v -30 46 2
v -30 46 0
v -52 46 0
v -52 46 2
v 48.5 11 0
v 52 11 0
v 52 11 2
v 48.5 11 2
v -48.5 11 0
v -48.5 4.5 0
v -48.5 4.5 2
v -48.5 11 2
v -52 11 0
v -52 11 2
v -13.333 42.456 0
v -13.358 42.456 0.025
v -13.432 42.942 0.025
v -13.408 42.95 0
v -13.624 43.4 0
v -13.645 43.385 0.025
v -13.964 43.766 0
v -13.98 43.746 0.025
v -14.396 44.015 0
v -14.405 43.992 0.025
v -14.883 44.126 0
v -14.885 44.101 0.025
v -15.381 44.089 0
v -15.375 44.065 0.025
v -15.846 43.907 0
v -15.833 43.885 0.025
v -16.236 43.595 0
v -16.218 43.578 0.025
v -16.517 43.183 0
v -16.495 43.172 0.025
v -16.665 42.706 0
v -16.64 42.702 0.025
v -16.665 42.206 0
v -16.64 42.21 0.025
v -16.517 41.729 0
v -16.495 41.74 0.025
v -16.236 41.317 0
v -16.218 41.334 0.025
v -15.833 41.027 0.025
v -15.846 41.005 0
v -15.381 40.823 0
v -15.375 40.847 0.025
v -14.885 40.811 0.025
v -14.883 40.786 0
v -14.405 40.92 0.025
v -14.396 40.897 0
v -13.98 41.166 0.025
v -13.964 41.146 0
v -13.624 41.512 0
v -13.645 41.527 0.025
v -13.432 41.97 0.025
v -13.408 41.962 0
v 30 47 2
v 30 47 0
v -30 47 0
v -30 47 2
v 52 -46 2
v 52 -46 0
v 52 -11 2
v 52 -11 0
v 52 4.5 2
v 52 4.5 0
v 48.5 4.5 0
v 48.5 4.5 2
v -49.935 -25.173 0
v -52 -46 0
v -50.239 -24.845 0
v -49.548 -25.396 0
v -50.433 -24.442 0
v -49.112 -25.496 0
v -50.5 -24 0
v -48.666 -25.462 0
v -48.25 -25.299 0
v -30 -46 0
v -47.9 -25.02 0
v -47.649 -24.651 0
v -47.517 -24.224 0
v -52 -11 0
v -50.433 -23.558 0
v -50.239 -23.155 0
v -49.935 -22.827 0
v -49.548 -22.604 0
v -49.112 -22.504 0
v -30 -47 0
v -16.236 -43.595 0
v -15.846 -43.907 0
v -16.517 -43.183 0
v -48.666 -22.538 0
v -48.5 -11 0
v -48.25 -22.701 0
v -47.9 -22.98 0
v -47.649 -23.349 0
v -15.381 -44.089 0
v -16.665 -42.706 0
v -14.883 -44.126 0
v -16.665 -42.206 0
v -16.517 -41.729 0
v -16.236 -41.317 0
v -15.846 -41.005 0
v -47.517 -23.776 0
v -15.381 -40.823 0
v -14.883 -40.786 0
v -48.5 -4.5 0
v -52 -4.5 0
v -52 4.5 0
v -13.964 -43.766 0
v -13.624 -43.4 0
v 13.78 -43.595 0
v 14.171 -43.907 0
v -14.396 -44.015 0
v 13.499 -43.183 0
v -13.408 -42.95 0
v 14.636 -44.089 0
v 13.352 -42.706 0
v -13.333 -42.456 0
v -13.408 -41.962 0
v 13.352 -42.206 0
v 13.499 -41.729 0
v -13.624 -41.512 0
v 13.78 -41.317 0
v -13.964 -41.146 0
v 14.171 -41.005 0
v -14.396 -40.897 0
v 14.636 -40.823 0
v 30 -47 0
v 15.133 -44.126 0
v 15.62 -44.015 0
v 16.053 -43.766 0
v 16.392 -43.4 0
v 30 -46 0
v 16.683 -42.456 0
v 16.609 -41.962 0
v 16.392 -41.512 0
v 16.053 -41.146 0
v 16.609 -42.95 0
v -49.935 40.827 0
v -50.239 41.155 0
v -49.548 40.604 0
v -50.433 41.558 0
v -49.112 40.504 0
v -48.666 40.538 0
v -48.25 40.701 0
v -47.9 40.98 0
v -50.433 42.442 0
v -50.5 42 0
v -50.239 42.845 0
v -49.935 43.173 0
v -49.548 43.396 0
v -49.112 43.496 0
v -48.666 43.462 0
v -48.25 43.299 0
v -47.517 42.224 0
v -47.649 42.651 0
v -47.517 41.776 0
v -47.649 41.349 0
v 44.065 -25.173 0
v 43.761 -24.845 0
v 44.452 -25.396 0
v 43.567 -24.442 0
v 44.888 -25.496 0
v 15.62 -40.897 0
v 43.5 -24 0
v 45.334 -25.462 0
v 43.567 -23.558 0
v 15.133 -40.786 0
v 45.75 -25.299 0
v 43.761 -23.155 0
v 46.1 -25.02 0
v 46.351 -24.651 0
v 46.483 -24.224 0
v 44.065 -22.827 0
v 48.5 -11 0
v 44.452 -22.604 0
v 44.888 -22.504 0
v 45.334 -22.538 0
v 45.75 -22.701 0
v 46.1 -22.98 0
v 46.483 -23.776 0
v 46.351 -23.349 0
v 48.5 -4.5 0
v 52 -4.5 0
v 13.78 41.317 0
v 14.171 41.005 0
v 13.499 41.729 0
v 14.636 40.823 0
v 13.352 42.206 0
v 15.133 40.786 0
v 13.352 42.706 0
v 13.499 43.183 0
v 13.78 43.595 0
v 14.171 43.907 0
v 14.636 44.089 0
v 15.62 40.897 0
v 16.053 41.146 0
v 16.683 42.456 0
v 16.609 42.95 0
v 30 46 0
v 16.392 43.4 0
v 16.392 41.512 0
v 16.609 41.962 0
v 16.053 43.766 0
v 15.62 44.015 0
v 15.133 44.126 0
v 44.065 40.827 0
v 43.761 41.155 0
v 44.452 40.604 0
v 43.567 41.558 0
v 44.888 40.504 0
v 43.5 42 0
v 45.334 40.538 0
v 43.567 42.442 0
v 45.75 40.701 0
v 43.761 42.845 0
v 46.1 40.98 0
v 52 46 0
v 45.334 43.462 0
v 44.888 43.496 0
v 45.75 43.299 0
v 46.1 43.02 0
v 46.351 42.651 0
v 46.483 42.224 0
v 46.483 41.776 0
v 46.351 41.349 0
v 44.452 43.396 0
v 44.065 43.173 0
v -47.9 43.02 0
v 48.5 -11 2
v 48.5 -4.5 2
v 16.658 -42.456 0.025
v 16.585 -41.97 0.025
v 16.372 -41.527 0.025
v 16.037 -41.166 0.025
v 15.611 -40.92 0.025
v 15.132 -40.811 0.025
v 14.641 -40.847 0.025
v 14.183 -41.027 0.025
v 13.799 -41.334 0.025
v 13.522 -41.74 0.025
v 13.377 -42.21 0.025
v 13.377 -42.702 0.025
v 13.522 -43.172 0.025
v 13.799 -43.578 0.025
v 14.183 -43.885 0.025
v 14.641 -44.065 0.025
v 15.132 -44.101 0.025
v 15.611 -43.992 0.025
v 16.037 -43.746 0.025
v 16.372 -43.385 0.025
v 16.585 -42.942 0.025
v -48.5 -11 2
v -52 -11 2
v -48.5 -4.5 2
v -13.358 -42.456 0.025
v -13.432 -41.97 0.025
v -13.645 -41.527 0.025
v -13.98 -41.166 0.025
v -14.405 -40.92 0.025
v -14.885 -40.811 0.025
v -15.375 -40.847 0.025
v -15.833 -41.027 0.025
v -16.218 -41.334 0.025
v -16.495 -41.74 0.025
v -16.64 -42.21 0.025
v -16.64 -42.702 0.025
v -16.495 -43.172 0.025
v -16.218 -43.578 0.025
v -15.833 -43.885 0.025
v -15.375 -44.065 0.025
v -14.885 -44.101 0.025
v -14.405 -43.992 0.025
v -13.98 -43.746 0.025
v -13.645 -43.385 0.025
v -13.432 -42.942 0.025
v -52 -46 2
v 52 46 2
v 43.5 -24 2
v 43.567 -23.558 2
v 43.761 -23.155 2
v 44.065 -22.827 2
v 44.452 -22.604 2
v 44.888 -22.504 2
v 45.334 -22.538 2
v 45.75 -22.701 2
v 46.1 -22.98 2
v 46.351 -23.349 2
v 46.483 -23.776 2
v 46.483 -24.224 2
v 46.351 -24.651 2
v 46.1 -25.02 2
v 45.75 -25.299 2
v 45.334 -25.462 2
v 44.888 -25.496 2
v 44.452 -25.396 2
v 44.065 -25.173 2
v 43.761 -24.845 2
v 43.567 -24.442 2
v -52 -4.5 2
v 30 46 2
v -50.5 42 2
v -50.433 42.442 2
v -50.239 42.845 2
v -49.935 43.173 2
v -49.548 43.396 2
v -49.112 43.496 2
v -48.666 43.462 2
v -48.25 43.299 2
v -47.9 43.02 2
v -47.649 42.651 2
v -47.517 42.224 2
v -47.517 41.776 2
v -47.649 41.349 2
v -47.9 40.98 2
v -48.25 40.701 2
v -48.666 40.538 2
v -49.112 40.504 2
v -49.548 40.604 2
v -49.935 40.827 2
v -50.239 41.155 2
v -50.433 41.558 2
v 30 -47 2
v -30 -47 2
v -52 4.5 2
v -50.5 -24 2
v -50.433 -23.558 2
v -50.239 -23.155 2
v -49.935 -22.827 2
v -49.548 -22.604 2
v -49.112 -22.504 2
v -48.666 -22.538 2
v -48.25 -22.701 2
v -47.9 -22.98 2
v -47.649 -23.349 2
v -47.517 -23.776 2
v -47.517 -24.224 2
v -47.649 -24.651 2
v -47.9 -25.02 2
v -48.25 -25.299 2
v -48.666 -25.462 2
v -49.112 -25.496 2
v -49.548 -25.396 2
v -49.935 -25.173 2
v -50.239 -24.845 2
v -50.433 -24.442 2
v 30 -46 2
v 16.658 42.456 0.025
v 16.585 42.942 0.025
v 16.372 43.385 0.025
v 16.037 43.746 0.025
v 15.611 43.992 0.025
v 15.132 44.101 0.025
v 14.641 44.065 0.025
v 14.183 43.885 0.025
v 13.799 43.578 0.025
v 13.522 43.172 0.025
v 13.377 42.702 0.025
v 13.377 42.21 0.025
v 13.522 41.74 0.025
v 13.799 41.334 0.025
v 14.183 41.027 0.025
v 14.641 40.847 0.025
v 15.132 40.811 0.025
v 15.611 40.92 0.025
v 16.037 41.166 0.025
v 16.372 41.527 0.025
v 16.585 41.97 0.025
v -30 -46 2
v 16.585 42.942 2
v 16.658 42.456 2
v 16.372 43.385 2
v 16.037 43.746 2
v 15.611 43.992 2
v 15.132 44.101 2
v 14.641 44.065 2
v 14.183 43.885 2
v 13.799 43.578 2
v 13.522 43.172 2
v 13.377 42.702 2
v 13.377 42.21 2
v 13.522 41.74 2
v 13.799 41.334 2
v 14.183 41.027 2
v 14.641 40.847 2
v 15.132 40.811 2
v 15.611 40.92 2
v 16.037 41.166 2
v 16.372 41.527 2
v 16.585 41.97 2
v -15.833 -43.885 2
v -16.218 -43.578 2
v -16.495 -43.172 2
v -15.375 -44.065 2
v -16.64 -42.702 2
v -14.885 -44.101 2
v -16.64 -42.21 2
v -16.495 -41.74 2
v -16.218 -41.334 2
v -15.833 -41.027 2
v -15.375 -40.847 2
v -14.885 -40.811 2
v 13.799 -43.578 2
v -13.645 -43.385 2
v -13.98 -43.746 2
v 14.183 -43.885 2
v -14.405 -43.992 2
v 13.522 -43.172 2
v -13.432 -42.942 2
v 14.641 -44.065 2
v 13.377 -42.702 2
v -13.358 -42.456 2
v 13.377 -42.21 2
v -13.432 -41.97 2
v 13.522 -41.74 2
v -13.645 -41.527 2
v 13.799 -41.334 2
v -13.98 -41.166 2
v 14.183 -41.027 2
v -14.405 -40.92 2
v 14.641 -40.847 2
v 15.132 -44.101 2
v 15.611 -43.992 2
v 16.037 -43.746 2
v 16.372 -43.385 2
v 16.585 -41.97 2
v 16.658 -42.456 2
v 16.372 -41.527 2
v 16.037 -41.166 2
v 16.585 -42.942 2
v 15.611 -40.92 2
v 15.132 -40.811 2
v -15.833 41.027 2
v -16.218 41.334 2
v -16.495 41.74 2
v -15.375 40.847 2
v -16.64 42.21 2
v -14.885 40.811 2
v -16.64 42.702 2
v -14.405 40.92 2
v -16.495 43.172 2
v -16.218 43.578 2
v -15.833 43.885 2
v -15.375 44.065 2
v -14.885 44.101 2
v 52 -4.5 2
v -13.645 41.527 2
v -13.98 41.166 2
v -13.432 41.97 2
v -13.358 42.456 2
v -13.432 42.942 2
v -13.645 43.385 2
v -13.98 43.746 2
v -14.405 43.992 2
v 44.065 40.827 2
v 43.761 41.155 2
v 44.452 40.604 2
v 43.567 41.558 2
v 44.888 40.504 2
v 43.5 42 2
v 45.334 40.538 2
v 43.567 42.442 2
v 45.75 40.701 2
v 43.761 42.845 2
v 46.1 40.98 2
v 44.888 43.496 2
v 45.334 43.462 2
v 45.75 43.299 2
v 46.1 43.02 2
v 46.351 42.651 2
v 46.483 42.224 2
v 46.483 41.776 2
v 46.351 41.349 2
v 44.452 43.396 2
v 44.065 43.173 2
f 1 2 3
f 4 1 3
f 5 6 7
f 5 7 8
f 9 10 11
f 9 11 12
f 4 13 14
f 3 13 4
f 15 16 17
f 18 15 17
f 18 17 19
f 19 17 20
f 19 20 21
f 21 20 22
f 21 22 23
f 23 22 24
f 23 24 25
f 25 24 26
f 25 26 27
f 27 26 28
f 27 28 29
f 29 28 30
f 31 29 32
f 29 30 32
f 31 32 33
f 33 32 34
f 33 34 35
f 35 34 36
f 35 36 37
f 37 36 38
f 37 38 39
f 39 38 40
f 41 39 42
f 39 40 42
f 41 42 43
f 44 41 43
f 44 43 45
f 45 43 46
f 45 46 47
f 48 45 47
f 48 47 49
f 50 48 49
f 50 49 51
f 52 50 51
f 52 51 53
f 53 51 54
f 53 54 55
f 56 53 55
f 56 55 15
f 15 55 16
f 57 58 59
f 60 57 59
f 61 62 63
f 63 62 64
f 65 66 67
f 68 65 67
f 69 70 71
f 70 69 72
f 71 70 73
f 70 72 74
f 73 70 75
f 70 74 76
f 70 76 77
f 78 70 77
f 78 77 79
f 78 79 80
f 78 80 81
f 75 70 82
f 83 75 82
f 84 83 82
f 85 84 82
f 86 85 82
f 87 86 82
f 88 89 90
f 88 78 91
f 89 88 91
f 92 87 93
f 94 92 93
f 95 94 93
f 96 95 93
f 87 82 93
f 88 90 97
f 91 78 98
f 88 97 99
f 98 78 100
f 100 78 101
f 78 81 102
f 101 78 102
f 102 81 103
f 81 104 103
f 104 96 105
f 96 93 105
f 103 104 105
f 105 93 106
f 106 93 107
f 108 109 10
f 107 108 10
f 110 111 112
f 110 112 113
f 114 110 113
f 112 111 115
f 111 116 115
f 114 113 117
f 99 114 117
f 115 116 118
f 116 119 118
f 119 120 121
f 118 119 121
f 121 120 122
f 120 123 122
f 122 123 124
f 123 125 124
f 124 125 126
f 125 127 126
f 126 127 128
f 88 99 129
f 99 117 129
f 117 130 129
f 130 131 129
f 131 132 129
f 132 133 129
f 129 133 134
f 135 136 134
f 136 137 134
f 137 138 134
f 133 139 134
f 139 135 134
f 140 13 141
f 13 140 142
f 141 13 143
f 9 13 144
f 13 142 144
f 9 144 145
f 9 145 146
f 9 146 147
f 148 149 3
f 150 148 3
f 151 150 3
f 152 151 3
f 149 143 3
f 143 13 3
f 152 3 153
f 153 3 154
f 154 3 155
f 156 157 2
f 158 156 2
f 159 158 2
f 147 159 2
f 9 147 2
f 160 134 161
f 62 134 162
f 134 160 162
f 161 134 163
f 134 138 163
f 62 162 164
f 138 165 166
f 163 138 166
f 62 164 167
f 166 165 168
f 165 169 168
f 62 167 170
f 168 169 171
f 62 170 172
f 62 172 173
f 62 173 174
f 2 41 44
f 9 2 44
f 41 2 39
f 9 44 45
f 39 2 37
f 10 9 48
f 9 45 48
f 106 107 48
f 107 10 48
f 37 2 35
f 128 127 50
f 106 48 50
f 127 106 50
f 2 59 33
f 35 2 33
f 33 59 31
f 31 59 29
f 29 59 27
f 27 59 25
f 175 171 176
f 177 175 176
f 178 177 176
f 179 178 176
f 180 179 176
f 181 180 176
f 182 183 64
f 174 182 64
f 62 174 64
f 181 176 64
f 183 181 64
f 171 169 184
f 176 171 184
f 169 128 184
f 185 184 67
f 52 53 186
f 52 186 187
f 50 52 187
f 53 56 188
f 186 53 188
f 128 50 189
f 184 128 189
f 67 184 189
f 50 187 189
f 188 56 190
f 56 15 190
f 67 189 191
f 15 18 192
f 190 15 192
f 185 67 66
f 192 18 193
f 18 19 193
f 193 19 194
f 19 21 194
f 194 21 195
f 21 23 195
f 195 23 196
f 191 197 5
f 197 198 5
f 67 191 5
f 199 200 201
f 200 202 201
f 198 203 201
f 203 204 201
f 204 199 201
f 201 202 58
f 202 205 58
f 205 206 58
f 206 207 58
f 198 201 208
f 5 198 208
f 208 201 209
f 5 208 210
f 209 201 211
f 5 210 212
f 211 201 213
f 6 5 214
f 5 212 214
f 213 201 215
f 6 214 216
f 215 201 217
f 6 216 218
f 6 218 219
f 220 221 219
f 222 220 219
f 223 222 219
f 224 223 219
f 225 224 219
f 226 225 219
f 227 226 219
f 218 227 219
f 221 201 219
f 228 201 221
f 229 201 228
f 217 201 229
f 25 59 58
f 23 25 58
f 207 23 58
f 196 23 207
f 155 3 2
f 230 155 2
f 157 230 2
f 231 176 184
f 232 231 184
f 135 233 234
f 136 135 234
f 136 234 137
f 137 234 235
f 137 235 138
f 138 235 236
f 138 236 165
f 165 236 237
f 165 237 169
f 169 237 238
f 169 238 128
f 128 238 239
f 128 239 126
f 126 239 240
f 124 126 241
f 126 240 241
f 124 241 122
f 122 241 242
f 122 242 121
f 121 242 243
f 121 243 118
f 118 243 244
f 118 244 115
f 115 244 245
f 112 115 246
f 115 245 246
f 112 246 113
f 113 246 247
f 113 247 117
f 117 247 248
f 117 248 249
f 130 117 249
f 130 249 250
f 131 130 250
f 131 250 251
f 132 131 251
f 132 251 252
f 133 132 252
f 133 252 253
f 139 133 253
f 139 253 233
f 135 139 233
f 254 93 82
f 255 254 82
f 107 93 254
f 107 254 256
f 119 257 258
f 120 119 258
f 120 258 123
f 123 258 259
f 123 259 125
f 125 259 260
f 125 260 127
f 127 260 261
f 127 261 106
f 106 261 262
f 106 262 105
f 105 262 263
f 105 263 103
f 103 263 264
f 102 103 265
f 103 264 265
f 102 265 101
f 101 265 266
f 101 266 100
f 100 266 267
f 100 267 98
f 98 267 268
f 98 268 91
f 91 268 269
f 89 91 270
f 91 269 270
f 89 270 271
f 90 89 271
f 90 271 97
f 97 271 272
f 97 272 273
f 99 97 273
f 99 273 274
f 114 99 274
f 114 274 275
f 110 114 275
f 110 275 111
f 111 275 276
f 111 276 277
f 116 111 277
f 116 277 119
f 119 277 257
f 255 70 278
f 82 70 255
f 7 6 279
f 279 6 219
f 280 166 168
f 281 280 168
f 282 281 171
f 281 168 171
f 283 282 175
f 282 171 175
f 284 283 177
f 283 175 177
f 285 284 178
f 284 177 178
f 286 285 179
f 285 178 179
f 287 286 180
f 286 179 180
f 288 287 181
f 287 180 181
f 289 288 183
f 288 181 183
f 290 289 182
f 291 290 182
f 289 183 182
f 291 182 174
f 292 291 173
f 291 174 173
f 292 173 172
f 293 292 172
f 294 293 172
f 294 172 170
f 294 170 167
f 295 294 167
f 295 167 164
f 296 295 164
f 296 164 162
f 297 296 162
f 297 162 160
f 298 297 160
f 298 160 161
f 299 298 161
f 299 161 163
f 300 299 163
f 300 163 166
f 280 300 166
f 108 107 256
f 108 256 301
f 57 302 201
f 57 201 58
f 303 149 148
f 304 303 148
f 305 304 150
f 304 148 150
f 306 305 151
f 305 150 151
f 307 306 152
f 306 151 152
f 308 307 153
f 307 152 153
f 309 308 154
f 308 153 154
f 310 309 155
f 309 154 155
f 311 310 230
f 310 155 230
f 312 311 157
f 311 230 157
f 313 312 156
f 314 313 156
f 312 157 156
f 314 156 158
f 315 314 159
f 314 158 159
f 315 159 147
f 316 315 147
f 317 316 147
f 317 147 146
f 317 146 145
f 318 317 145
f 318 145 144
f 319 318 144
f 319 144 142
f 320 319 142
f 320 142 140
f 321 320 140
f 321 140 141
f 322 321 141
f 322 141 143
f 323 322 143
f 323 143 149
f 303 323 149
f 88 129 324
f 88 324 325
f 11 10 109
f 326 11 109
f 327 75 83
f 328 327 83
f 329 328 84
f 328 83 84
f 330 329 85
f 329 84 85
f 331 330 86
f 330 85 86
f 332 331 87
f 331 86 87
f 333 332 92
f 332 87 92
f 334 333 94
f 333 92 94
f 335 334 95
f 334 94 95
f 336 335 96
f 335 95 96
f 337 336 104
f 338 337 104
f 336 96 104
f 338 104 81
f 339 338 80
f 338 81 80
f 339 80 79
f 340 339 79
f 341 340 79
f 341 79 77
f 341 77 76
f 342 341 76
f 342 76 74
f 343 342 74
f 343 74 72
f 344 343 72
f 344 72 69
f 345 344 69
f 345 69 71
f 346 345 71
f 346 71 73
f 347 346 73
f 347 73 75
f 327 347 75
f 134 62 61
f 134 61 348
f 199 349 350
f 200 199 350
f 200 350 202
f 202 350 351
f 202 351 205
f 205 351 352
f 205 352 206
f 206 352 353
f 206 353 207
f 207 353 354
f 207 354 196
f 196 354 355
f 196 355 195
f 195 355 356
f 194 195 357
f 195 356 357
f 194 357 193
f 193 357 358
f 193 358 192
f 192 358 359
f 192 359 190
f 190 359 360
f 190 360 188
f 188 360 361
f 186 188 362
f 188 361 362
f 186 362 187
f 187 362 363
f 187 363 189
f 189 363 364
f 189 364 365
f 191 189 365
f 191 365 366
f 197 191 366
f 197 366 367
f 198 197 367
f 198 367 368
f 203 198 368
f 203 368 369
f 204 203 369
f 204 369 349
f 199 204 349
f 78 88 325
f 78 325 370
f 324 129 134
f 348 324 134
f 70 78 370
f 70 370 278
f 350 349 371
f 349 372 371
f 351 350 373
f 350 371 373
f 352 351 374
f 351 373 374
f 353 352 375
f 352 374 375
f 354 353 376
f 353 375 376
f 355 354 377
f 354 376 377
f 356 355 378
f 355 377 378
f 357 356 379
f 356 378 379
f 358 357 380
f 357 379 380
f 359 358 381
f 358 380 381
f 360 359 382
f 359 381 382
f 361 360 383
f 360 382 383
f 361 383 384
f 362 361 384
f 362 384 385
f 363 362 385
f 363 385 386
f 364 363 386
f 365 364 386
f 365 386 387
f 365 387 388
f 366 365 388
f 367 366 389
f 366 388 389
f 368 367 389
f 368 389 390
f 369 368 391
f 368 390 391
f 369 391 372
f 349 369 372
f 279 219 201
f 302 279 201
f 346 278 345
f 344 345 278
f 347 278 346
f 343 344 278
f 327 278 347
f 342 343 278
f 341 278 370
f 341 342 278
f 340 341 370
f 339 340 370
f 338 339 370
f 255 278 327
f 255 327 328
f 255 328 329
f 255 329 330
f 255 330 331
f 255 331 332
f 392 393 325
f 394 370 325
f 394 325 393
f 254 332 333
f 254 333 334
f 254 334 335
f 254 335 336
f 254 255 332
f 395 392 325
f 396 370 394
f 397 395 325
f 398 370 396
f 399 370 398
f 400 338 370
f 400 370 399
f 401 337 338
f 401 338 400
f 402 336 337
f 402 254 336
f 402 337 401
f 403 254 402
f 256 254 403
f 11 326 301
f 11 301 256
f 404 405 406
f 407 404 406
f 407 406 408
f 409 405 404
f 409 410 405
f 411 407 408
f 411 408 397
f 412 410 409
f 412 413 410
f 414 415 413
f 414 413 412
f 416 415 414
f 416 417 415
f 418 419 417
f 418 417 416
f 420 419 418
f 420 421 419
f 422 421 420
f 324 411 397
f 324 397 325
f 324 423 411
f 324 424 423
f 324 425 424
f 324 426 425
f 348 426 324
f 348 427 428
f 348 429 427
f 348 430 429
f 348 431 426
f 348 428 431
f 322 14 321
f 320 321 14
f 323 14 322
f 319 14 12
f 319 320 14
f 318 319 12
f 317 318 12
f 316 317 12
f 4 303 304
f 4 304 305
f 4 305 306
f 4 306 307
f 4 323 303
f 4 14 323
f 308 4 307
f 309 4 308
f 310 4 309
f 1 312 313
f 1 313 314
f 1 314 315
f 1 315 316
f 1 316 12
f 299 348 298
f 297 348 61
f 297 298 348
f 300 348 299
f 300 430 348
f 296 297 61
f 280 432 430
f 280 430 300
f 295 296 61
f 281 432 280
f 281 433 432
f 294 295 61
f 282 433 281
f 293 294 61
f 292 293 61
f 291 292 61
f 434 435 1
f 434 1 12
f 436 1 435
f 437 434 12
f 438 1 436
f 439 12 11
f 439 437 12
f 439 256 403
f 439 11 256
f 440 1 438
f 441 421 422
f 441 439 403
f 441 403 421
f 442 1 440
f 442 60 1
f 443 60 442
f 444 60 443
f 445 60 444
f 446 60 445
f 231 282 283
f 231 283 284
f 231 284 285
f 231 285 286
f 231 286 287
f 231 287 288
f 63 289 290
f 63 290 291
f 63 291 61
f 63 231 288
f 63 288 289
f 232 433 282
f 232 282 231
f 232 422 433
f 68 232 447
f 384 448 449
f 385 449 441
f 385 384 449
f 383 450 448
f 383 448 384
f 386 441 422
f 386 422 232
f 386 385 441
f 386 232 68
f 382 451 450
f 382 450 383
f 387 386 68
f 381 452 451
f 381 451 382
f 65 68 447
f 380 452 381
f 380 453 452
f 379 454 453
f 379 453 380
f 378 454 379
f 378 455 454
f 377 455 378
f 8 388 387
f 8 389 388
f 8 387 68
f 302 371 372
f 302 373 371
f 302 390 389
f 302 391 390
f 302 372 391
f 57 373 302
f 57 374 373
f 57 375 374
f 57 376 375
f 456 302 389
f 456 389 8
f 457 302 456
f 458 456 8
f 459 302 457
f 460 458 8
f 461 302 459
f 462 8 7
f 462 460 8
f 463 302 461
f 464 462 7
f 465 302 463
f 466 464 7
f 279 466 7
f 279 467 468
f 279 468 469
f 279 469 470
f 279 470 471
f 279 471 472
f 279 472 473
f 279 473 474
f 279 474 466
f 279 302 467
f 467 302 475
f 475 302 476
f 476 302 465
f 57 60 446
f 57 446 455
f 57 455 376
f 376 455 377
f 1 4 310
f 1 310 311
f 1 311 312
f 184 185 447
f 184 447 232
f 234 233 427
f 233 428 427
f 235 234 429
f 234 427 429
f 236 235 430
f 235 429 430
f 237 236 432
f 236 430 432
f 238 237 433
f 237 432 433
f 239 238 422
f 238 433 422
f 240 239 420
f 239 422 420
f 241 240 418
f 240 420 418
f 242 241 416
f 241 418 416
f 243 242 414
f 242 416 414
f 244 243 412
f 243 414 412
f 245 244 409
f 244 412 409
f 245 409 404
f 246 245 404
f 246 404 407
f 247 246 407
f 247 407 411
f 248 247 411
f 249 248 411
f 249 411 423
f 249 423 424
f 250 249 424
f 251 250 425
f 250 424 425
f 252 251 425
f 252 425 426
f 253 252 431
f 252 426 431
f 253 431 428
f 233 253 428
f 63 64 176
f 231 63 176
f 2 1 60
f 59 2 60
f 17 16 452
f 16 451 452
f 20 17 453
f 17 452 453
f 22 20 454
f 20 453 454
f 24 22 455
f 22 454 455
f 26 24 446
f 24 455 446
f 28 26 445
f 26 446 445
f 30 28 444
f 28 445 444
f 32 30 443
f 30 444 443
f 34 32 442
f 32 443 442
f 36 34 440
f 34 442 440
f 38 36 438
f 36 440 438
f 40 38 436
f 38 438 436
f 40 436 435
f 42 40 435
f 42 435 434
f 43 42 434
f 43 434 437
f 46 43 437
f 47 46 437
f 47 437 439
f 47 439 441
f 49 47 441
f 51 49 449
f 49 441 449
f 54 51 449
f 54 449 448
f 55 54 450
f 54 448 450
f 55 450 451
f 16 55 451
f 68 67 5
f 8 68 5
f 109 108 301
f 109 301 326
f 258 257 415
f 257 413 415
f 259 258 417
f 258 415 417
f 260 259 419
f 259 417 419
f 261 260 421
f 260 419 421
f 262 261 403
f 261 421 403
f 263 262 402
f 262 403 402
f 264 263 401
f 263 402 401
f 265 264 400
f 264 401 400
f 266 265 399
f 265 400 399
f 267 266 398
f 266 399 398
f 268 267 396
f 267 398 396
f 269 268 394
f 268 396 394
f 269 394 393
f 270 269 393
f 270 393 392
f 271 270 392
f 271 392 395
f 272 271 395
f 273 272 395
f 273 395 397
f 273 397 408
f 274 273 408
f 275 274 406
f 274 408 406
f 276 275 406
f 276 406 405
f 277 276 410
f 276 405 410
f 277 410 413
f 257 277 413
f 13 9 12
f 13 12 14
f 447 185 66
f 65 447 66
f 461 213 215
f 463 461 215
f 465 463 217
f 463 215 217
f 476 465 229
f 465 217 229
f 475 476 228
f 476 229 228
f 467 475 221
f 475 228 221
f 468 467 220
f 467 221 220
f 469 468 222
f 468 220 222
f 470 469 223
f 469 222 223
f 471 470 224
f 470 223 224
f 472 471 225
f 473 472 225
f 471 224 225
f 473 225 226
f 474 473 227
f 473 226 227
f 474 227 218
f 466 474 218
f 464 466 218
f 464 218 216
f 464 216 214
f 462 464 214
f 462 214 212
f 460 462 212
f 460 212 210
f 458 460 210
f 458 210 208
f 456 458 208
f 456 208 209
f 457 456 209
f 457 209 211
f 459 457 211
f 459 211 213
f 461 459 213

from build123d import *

# Parameters (mm, degrees)
SKETCH1_W                             = 106
SKETCH1_H                             = 95
BOSS_EXTRUDE1_DEPTH                   = 2
SKETCH4_W                             = 128.277926748
SKETCH4_H                             = 110.461548034
SKETCH4_W_2                           = 104
SKETCH4_H_2                           = 94
CUT_EXTRUDE1_DEPTH                    = 10
SKETCH6_W                             = 3.5
SKETCH6_H                             = 6.5
SKETCH6_W_2                           = 22.479668753
SKETCH6_H_2                           = 1.816385789
CUT_EXTRUDE2_DEPTH                    = 5
SKETCH8_R                             = 1.5
CUT_EXTRUDE3_DEPTH                    = 5
TAP_DRILL_FOR_M4X0_7_TAP2_D           = 3.3
TAP_DRILL_FOR_M4X0_7_TAP2_DEPTH       = 10
TAP_DRILL_FOR_M4X0_7_TAP2_CSINK_D     = 3.35
TAP_DRILL_FOR_M4X0_7_TAP2_CSINK_ANGLE = 90
TAP_DRILL_FOR_M4X0_7_TAP2_TIP         = 0.991420021


with BuildPart() as part:
    # Sketch1 → Boss-Extrude1 (new body)
    with BuildSketch(Plane.XY):
        Rectangle(SKETCH1_W, SKETCH1_H)
    extrude(amount=BOSS_EXTRUDE1_DEPTH)

    # Sketch4 → Cut-Extrude1 (cut)
    with BuildSketch(Plane(origin=(0, 0, 0), x_dir=(-1, 0, 0), z_dir=(0, 0, -1))):
        Rectangle(SKETCH4_W, SKETCH4_H)
        Rectangle(SKETCH4_W_2, SKETCH4_H_2, mode=Mode.SUBTRACT)
    extrude(amount=-CUT_EXTRUDE1_DEPTH, mode=Mode.SUBTRACT)

    # Sketch6 → Cut-Extrude2 (cut)
    with BuildSketch(Plane(origin=(0, 0, 0), x_dir=(-1, 0, 0), z_dir=(0, 0, -1))):
        with Locations((-50.25, -7.75)):
            Rectangle(SKETCH6_W, SKETCH6_H)
        with Locations((-50.25, 7.75)):
            Rectangle(SKETCH6_W, SKETCH6_H)
        with Locations((50.25, -7.75)):
            Rectangle(SKETCH6_W, SKETCH6_H)
        with Locations((50.25, 7.75)):
            Rectangle(SKETCH6_W, SKETCH6_H)
        with Locations((-41.239834377, -46.908192895)):
            Rectangle(SKETCH6_W_2, SKETCH6_H_2)
        with Locations((41.239834377, -46.908192895)):
            Rectangle(SKETCH6_W_2, SKETCH6_H_2)
        with Locations((-41.239834377, 46.908192895)):
            Rectangle(SKETCH6_W_2, SKETCH6_H_2)
        with Locations((41.239834377, 46.908192895)):
            Rectangle(SKETCH6_W_2, SKETCH6_H_2)
    extrude(amount=-CUT_EXTRUDE2_DEPTH, mode=Mode.SUBTRACT)

    # Sketch8 → Cut-Extrude3 (cut)
    with BuildSketch(Plane(origin=(0, 0, 0), x_dir=(-1, 0, 0), z_dir=(0, 0, -1))):
        with Locations((-45, 42)):
            Circle(SKETCH8_R)
        with Locations((-45, -24)):
            Circle(SKETCH8_R)
        with Locations((49, 42)):
            Circle(SKETCH8_R)
        with Locations((49, -24)):
            Circle(SKETCH8_R)
    extrude(amount=-CUT_EXTRUDE3_DEPTH, mode=Mode.SUBTRACT)

    # Tap Drill for M4x0.7 Tap2
    with Locations(Plane(origin=(0, 0, 0), x_dir=(-1, 0, 0), z_dir=(0, 0, -1))):
        with Locations((-15.008290978, 42.455982414), (-15.008290978, -42.455982414), (15.008290978, -42.455982414), (15.008290978, 42.455982414)):
            CounterSinkHole(TAP_DRILL_FOR_M4X0_7_TAP2_D / 2, TAP_DRILL_FOR_M4X0_7_TAP2_CSINK_D / 2, depth=TAP_DRILL_FOR_M4X0_7_TAP2_DEPTH, counter_sink_angle=TAP_DRILL_FOR_M4X0_7_TAP2_CSINK_ANGLE)
            with Locations((0, 0, -(TAP_DRILL_FOR_M4X0_7_TAP2_DEPTH + TAP_DRILL_FOR_M4X0_7_TAP2_TIP / 2))):  # 118° drill point
                Cone(0, TAP_DRILL_FOR_M4X0_7_TAP2_D / 2, TAP_DRILL_FOR_M4X0_7_TAP2_TIP, mode=Mode.SUBTRACT)


solid = part.part
